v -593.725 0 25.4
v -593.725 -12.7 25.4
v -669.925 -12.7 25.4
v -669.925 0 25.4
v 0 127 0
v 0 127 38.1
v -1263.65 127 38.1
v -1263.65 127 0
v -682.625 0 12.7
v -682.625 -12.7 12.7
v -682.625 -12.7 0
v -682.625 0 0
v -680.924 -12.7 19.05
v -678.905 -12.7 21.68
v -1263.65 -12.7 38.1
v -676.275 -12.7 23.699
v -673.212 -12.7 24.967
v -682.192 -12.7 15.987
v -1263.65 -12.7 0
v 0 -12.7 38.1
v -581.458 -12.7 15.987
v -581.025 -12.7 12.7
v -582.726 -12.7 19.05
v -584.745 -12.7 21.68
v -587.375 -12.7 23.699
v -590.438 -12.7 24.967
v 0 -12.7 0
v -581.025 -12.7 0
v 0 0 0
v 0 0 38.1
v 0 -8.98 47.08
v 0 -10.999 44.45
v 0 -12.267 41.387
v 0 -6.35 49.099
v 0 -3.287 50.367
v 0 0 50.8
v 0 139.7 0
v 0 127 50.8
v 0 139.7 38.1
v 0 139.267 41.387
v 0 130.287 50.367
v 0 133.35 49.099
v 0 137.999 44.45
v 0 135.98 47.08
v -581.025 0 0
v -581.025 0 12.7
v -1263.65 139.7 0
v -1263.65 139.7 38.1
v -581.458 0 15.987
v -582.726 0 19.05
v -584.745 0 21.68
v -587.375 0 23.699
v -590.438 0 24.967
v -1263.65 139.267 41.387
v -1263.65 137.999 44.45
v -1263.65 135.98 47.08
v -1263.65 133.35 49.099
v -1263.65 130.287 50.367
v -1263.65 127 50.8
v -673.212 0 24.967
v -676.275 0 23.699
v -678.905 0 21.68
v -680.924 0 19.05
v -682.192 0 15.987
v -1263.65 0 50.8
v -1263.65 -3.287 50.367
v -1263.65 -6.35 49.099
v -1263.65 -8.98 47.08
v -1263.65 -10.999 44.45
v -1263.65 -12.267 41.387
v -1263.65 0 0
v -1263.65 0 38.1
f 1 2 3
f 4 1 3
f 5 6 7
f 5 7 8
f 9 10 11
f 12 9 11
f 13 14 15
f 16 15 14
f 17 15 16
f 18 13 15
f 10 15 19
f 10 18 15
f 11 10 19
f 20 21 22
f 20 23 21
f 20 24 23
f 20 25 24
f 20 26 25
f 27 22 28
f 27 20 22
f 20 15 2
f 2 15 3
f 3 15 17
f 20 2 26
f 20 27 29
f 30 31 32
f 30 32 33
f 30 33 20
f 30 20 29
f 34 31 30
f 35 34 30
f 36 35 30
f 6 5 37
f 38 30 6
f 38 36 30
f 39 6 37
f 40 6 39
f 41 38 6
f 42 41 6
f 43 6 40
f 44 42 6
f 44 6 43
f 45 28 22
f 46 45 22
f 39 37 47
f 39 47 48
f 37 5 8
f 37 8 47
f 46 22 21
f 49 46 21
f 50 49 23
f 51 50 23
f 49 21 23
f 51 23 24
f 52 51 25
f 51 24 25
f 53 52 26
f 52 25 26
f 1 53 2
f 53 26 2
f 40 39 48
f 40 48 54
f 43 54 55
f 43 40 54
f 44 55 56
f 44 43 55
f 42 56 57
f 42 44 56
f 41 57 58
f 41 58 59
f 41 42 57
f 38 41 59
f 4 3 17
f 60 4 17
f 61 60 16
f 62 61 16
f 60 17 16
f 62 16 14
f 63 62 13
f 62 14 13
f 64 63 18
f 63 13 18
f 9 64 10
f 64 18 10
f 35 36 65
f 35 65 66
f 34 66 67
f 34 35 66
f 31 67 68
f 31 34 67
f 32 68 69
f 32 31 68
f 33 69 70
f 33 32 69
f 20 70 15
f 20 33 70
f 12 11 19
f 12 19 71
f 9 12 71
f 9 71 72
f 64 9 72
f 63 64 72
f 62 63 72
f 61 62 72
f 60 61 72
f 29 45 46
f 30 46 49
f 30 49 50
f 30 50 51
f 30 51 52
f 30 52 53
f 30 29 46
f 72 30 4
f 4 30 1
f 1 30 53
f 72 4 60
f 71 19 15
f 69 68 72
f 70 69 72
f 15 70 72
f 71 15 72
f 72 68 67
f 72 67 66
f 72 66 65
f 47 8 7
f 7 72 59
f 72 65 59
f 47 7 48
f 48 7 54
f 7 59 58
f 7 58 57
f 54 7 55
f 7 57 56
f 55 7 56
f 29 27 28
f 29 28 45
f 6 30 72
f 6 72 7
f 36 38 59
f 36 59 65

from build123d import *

# Parameters (mm, degrees)
F1_DEPTH = 1263.65
F3_DEPTH = 12.7


with BuildPart() as f1:
    # F0 (on Right) → F1 (new body)
    with BuildSketch(Plane.YZ):
        with BuildLine():
            Line((-12.7, 0), (0, 0))
            Line((0, 0), (0, 38.1))
            Line((0, 38.1), (127, 38.1))
            Line((127, 38.1), (127, 0))
            Line((127, 0), (139.7, 0))
            Line((139.7, 0), (139.7, 38.1))
            ThreePointArc((139.7, 38.1), (135.980256, 47.080256), (127, 50.8))
            Line((127, 50.8), (0, 50.8))
            ThreePointArc((0, 50.8), (-8.980256, 47.080256), (-12.7, 38.1))
            Line((-12.7, 38.1), (-12.7, 0))
        make_face()
    extrude(amount=-F1_DEPTH)

    # F2 (on face) → F3 (cut)
    with BuildSketch(Plane.XZ.offset(12.7)):
        with BuildLine():
            Line((-682.625, 0), (-581.025, 0))
            Line((-581.025, 0), (-581.025, 12.7))
            ThreePointArc((-581.025, 12.7), (-584.744744, 21.680256), (-593.725, 25.4))
            Line((-593.725, 25.4), (-669.925, 25.4))
            ThreePointArc((-669.925, 25.4), (-678.905256, 21.680256), (-682.625, 12.7))
            Line((-682.625, 12.7), (-682.625, 0))
        make_face()
    extrude(amount=-F3_DEPTH, mode=Mode.SUBTRACT)


solid = f1.part
